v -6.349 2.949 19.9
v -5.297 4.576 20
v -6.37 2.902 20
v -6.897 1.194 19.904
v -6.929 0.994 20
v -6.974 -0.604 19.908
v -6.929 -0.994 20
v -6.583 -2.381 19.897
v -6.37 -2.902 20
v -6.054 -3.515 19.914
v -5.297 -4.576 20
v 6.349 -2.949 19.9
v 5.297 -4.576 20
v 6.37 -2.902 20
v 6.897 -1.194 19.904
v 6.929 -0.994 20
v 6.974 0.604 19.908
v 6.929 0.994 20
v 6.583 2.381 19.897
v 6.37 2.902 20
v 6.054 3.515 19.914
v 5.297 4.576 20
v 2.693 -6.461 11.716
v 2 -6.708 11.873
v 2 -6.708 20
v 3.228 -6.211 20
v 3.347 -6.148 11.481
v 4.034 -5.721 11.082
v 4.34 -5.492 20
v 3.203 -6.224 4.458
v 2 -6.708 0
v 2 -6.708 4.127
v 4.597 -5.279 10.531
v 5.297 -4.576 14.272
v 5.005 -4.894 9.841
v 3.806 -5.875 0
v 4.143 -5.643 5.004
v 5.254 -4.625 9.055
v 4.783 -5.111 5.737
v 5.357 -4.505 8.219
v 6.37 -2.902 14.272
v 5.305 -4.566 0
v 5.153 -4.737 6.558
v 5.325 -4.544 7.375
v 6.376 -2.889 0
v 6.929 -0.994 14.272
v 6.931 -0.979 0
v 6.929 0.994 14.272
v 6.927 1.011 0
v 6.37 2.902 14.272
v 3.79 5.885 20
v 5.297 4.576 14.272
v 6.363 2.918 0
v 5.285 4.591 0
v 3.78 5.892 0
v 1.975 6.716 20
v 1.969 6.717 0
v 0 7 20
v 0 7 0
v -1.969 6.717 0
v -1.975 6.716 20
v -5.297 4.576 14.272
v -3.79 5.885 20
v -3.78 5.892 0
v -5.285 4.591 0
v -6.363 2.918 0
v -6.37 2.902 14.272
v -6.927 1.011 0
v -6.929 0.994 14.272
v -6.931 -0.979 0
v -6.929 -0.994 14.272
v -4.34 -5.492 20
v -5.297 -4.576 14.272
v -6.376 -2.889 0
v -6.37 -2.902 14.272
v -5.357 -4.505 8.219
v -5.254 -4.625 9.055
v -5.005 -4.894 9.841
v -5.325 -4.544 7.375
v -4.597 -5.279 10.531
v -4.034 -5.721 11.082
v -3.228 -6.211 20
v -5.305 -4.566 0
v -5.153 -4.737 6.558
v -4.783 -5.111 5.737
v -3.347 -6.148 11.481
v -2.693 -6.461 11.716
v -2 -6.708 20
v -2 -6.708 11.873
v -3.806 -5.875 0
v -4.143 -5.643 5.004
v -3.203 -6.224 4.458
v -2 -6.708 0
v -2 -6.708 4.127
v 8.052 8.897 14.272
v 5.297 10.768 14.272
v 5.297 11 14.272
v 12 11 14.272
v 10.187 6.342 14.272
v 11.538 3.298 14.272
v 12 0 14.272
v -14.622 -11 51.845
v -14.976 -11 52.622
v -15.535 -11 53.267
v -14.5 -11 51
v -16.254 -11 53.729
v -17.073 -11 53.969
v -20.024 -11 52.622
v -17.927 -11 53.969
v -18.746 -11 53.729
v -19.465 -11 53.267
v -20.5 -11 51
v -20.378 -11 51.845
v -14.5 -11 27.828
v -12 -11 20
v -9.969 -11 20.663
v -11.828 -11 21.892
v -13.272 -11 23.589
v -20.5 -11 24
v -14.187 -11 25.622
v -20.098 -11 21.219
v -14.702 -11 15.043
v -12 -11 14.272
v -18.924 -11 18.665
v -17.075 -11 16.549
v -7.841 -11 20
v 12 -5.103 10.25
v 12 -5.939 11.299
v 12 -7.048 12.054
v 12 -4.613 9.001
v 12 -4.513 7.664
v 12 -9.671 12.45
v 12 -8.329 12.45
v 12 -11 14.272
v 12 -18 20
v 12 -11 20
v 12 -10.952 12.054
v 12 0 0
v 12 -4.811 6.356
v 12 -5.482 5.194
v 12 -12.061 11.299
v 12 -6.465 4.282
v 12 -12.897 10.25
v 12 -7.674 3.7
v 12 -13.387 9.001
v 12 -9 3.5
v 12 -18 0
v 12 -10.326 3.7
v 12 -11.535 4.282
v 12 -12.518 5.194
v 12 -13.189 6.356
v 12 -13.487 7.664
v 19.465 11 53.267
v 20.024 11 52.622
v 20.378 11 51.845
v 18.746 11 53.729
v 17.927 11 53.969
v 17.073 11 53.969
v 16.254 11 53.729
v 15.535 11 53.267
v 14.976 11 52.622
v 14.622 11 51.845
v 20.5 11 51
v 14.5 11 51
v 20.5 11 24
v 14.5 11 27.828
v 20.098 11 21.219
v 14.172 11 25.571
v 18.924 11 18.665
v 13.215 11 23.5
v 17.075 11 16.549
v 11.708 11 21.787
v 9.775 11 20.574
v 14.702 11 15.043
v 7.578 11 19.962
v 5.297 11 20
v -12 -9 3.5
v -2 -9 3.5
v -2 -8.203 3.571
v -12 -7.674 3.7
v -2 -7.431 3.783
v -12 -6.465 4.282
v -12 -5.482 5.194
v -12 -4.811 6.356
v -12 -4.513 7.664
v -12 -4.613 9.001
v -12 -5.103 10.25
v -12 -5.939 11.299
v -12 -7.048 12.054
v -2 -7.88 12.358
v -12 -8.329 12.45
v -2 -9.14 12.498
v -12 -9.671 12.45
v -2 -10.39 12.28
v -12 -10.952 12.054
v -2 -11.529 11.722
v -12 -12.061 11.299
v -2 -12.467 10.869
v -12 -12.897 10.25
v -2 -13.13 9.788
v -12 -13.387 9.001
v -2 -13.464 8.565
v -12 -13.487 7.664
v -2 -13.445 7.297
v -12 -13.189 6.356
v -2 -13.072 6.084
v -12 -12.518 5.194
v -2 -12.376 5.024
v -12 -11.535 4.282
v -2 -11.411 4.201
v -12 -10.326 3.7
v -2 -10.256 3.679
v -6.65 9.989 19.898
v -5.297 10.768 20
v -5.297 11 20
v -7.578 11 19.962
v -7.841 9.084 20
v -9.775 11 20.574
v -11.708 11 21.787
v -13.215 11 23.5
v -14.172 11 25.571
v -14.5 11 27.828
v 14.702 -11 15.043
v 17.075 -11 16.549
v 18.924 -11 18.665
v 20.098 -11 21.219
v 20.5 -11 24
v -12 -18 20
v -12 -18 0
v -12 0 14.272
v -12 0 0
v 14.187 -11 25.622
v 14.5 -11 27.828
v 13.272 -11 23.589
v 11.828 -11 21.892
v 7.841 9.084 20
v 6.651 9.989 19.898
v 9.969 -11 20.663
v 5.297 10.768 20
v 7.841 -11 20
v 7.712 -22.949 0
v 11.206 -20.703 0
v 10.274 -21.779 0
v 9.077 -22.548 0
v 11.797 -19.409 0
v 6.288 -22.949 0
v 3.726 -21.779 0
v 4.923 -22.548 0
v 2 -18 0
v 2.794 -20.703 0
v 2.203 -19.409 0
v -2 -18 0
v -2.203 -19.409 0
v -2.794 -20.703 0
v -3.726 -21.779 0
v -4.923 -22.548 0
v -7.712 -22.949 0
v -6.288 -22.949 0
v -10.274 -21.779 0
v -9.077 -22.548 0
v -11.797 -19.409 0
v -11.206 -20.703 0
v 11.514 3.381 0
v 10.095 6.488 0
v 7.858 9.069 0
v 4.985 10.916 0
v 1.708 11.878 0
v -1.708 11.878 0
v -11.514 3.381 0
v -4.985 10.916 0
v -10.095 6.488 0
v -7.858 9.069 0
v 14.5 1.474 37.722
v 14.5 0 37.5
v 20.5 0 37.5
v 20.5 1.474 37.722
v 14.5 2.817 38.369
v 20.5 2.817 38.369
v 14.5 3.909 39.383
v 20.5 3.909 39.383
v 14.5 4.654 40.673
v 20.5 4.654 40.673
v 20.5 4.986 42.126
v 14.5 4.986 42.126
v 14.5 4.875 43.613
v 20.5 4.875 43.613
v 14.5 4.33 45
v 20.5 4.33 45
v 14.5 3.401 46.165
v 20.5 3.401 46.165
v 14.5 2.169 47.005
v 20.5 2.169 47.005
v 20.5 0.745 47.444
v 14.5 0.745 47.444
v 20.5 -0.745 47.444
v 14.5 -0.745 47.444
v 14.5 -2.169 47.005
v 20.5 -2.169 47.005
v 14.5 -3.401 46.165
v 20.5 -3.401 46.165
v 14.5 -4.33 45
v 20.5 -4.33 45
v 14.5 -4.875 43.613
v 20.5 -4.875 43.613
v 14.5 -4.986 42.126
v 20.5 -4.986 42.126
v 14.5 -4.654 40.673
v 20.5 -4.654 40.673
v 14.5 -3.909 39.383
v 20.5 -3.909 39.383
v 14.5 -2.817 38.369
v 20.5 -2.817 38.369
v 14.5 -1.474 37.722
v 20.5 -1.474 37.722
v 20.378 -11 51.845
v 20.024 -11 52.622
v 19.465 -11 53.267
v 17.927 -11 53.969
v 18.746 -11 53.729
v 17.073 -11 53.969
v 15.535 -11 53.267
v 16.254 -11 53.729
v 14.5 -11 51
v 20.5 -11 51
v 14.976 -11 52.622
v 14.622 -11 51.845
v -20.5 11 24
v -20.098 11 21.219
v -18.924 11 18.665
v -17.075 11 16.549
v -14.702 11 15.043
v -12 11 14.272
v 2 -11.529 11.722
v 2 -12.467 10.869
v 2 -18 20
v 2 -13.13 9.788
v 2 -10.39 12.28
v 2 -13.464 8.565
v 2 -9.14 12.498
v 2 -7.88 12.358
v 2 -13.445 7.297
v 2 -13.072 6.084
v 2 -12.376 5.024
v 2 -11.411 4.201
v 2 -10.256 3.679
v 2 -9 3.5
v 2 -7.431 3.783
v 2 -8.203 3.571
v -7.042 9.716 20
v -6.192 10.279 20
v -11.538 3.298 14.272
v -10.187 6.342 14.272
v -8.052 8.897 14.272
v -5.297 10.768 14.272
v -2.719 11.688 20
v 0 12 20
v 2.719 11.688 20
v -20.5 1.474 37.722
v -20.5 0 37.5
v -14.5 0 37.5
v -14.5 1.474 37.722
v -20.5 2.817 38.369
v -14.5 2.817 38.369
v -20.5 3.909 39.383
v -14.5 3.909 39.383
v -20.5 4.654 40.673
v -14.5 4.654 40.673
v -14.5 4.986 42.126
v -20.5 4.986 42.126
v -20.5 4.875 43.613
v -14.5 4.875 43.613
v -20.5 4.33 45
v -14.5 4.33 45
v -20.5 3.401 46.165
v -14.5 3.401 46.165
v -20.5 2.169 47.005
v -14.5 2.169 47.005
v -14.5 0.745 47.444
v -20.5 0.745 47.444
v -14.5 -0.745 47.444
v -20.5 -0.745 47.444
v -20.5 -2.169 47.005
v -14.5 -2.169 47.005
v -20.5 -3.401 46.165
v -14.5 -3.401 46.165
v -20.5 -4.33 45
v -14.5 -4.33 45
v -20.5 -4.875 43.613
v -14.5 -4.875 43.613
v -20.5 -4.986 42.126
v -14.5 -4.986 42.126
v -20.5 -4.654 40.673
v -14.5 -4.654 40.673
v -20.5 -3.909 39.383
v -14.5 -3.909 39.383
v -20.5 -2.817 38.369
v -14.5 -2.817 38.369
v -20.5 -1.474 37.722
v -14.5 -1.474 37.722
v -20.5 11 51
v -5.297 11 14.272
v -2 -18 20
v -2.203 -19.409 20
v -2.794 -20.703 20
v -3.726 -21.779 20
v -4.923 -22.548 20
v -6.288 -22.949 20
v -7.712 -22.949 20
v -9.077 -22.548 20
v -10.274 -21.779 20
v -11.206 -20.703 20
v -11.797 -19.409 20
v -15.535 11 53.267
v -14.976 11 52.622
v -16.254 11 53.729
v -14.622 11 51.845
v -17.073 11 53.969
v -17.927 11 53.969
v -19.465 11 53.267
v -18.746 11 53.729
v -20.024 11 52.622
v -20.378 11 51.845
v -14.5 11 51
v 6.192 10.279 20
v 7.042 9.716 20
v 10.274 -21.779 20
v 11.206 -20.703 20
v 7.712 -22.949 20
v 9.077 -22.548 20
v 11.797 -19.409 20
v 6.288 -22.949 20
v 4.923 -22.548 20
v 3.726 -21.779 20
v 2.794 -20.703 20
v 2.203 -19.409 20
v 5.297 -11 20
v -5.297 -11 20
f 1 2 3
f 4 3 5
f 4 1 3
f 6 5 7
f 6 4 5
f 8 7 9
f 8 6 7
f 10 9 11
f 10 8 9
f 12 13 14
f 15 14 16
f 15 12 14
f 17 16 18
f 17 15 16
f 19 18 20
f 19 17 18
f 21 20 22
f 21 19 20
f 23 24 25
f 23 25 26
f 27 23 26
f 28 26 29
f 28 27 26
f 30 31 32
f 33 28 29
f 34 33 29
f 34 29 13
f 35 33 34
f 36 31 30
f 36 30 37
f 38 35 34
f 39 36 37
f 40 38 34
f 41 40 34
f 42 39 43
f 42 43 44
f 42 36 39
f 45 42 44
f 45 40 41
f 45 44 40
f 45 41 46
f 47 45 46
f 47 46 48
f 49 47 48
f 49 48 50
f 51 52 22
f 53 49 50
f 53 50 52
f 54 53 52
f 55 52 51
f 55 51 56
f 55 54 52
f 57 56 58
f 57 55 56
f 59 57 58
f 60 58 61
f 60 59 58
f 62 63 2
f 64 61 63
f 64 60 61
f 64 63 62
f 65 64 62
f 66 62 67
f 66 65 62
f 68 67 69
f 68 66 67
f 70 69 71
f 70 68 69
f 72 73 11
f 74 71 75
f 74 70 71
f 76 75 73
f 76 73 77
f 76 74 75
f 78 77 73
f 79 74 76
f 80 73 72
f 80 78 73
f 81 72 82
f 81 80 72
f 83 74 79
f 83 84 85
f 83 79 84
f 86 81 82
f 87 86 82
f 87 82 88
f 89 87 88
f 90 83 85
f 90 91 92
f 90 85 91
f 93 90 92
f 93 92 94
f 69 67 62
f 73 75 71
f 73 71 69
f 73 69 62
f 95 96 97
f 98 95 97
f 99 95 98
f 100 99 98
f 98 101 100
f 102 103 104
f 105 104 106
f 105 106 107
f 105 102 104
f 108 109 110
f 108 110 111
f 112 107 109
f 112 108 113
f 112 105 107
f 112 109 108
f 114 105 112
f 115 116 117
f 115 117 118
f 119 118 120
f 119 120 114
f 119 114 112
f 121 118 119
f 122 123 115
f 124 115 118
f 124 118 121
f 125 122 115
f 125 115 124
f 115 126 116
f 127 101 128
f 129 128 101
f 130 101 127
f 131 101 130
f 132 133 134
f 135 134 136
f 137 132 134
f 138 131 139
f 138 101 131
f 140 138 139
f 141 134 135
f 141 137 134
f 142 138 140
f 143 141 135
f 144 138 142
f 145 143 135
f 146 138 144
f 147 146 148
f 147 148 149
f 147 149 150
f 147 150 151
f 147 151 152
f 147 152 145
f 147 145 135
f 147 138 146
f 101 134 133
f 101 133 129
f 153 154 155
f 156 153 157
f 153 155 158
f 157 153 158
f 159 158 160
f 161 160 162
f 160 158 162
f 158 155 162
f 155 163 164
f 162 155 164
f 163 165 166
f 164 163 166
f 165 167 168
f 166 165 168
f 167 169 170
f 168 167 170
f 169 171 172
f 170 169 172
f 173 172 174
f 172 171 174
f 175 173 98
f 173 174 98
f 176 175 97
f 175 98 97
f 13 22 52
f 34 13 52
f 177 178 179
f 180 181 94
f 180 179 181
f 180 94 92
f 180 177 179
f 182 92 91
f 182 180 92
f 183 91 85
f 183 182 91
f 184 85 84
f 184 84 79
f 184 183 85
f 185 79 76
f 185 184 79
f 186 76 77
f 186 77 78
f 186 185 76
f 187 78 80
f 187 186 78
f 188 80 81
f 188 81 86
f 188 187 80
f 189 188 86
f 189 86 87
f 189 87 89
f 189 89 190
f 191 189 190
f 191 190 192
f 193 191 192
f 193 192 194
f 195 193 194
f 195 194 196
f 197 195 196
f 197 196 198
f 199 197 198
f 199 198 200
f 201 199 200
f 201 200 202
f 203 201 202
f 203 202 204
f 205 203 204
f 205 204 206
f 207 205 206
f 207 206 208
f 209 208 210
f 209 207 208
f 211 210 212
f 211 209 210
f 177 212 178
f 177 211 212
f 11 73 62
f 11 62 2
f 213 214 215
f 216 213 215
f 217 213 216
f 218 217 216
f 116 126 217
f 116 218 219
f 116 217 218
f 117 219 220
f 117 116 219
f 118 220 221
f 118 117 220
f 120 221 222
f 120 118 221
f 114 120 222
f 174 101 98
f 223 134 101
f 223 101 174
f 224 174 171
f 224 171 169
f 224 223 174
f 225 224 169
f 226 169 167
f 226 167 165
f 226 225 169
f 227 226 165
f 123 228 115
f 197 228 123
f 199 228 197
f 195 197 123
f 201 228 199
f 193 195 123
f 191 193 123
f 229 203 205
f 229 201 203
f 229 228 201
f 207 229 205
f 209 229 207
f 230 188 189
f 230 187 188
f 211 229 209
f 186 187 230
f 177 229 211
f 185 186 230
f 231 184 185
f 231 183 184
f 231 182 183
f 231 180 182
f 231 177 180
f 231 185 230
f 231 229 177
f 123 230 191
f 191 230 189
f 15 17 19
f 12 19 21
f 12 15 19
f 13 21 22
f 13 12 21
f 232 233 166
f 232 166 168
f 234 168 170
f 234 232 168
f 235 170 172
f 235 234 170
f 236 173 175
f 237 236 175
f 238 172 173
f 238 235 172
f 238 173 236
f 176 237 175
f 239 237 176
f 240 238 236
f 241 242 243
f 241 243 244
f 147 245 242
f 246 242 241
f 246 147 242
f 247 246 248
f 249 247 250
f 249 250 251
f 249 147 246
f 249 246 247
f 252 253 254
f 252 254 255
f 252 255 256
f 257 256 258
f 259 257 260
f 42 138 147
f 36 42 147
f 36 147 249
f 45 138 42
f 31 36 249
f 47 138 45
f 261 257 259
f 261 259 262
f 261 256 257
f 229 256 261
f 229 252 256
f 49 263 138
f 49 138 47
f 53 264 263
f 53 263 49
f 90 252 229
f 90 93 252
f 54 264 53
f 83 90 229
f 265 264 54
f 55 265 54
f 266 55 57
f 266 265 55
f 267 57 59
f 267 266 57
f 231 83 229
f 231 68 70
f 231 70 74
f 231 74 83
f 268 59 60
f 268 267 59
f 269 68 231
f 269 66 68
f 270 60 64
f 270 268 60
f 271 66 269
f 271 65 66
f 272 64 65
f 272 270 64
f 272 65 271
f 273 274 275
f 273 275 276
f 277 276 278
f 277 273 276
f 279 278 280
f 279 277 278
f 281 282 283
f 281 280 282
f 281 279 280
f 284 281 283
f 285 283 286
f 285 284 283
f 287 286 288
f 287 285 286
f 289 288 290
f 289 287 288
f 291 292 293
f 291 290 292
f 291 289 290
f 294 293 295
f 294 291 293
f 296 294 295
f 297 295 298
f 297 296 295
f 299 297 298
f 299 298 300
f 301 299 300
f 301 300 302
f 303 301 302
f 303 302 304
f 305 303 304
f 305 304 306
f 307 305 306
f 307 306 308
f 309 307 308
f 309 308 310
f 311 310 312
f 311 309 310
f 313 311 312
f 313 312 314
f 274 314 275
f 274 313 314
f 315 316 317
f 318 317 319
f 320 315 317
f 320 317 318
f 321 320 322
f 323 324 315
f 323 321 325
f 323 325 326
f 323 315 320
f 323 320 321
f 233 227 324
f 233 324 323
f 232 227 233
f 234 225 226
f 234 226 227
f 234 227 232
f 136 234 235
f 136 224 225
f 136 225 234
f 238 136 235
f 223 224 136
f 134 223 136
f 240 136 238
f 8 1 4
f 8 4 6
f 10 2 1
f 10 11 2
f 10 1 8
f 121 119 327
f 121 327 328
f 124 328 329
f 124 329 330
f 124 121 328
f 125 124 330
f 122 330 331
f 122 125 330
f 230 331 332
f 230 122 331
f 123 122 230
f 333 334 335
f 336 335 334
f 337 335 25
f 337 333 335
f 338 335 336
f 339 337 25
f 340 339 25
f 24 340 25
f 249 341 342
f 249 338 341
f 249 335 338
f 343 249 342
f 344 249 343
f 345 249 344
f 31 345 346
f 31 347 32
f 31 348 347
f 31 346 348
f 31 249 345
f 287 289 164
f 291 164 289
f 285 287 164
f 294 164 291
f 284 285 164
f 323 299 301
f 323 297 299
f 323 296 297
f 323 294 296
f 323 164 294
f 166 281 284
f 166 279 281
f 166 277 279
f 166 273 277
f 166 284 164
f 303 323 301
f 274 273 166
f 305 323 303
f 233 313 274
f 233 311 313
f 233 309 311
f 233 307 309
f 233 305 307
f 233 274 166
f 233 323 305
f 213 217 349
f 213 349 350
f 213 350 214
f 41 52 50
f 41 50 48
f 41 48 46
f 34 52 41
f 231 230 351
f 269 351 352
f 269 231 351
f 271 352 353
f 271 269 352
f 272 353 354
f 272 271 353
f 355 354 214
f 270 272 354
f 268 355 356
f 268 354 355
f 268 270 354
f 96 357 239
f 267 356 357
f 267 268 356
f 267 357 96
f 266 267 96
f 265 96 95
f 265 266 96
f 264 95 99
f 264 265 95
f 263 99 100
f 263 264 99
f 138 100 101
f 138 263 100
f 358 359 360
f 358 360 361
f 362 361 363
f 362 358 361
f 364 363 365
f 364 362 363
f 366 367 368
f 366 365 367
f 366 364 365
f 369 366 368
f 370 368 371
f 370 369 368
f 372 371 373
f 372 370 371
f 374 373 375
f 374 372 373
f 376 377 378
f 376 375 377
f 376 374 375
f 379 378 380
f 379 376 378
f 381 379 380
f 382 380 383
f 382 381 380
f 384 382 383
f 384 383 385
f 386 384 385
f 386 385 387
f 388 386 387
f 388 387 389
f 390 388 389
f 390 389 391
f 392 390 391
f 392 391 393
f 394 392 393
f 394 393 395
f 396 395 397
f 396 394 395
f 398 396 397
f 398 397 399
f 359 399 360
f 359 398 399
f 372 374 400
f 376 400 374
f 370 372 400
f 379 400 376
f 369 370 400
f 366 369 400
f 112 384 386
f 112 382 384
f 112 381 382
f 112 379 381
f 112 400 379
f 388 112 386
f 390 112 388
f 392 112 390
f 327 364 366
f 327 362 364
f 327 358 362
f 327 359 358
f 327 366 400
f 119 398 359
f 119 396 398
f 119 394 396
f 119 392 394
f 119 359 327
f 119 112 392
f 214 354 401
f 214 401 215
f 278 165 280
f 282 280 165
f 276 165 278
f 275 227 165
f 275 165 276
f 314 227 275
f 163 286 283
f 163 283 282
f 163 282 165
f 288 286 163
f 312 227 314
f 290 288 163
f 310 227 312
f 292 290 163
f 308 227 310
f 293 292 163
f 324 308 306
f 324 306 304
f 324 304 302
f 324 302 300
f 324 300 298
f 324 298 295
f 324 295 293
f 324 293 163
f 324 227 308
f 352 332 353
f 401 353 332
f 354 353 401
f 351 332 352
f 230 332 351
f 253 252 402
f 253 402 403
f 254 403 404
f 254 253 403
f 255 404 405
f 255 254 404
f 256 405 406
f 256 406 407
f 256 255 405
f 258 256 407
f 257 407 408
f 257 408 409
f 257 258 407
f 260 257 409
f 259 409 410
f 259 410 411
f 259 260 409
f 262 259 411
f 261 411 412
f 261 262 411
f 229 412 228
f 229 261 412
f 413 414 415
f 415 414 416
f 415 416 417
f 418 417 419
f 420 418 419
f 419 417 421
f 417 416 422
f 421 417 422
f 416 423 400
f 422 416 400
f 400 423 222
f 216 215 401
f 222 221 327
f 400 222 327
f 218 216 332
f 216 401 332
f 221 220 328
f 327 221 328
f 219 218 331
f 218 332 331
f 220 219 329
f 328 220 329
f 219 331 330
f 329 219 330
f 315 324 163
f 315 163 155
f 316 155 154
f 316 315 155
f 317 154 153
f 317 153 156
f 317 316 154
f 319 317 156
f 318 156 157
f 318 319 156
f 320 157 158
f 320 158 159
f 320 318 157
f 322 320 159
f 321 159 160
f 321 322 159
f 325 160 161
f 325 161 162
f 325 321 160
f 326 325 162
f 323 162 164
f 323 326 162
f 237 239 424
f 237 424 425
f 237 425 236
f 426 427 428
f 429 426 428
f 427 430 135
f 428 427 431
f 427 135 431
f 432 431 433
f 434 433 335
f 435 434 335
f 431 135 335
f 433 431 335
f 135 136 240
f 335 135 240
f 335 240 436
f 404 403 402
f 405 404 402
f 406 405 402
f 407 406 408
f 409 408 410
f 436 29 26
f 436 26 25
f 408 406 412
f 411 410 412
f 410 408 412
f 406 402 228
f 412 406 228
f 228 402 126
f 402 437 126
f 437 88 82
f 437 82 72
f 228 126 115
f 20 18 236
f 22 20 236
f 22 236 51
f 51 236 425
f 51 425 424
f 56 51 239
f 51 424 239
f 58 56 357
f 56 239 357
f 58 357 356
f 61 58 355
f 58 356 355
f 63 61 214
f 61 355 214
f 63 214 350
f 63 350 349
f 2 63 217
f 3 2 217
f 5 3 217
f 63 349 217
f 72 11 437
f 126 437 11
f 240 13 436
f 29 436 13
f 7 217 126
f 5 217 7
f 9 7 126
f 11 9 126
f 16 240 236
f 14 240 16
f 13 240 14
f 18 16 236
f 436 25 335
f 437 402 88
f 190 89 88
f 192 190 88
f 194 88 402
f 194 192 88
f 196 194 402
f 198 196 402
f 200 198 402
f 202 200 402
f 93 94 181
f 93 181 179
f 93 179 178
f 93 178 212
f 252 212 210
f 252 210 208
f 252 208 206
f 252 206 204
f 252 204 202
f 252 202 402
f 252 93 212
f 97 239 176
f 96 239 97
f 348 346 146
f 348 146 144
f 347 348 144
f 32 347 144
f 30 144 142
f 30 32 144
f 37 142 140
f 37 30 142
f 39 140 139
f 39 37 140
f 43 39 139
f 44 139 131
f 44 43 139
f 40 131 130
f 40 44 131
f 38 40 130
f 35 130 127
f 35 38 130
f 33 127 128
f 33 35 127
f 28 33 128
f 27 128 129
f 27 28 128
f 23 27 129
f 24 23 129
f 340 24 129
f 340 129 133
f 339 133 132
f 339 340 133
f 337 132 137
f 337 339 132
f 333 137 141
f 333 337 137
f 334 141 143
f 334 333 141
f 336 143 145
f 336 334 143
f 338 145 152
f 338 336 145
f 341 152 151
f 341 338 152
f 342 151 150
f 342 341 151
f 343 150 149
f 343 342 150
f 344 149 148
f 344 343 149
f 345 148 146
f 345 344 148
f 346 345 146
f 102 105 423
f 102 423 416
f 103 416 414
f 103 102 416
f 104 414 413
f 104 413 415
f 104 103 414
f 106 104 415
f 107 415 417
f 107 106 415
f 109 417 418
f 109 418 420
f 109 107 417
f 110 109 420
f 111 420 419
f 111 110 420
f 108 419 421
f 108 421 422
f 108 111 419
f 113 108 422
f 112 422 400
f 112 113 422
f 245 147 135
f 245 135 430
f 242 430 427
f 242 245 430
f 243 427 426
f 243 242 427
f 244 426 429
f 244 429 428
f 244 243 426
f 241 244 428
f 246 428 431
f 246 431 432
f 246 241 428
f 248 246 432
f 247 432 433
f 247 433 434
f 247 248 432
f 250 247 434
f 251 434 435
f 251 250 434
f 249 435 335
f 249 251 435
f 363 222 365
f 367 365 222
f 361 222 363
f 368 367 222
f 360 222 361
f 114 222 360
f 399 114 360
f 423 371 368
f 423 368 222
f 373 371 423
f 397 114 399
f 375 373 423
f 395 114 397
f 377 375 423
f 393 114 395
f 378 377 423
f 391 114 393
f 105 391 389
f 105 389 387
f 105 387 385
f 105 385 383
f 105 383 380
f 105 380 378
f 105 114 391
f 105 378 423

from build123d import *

# Parameters (mm, degrees)
BOSS_EXTRUDE1_DEPTH      = 20
BOSS_EXTRUDE2_DEPTH      = 11
BOSS_EXTRUDE2_DEPTH_BACK = 11
CUT_EXTRUDE1_DEPTH       = 63.171134781
CUT_EXTRUDE1_DEPTH_BACK  = 63.171134781
SKETCH3_R                = 5
SKETCH3_R_2              = 4.5


with BuildPart() as part:
    # Sketch1 → Boss-Extrude1 (new body)
    with BuildSketch(Plane.XY):
        with BuildLine():
            Line((-12, -18), (-12, 0))
            ThreePointArc((-12, 0), (0, 12), (12, 0))
            Line((12, 0), (12, -18))
            ThreePointArc((12, -18), (7, -23), (2, -18))
            Line((2, -18), (2, -6.708203932))
            ThreePointArc((2, -6.708203932), (0, 7), (-2, -6.708203932))
            Line((-2, -6.708203932), (-2, -18))
            ThreePointArc((-2, -18), (-7, -23), (-12, -18))
        make_face()
    extrude(amount=BOSS_EXTRUDE1_DEPTH)

    # Sketch2 → Boss-Extrude2 (add, two sides: drawn at the far end of the back side and taken through both)
    with BuildSketch(Plane(origin=(0, 0, 0), x_dir=(1, 0, 0), z_dir=(0, 1, 0)).offset(-BOSS_EXTRUDE2_DEPTH_BACK)):
        with BuildLine():
            Line((-20.5, -51), (-20.5, -24))
            ThreePointArc((-20.5, -24), (-18.075652903, -17.540680891), (-12, -14.271628429))
            Line((-12, -14.271628429), (-5.296851039, -14.271628429))
            Line((-5.296851039, -14.271628429), (-5.296851039, -20))
            ThreePointArc((-5.296851039, -20), (-11.707630257, -21.787067507), (-14.5, -27.828124672))
            Line((-14.5, -27.828124672), (-14.5, -51))
            ThreePointArc((-14.5, -51), (-17.5, -54), (-20.5, -51))
        make_face()
        with BuildLine():
            Line((14.5, -51), (14.5, -27.828124672))
            ThreePointArc((14.5, -27.828124672), (11.707630257, -21.787067507), (5.296851039, -20))
            Line((5.296851039, -20), (5.296851039, -14.271628429))
            Line((5.296851039, -14.271628429), (12, -14.271628429))
            ThreePointArc((12, -14.271628429), (18.075652903, -17.540680891), (20.5, -24))
            Line((20.5, -24), (20.5, -51))
            ThreePointArc((20.5, -51), (17.5, -54), (14.5, -51))
        make_face()
    extrude(amount=BOSS_EXTRUDE2_DEPTH + BOSS_EXTRUDE2_DEPTH_BACK)

    # Sketch3 → Cut-Extrude1 (cut, two sides: drawn at the far end of the back side and taken through both)
    with BuildSketch(Plane(origin=(0, 0, 0), x_dir=(0, 0, -1), z_dir=(1, 0, 0)).offset(-CUT_EXTRUDE1_DEPTH_BACK)):
        with Locations((-42.5, 0)):
            Circle(SKETCH3_R)
        with Locations((-8, -9)):
            Circle(SKETCH3_R_2)
    extrude(amount=CUT_EXTRUDE1_DEPTH + CUT_EXTRUDE1_DEPTH_BACK, mode=Mode.SUBTRACT)


solid = part.part
